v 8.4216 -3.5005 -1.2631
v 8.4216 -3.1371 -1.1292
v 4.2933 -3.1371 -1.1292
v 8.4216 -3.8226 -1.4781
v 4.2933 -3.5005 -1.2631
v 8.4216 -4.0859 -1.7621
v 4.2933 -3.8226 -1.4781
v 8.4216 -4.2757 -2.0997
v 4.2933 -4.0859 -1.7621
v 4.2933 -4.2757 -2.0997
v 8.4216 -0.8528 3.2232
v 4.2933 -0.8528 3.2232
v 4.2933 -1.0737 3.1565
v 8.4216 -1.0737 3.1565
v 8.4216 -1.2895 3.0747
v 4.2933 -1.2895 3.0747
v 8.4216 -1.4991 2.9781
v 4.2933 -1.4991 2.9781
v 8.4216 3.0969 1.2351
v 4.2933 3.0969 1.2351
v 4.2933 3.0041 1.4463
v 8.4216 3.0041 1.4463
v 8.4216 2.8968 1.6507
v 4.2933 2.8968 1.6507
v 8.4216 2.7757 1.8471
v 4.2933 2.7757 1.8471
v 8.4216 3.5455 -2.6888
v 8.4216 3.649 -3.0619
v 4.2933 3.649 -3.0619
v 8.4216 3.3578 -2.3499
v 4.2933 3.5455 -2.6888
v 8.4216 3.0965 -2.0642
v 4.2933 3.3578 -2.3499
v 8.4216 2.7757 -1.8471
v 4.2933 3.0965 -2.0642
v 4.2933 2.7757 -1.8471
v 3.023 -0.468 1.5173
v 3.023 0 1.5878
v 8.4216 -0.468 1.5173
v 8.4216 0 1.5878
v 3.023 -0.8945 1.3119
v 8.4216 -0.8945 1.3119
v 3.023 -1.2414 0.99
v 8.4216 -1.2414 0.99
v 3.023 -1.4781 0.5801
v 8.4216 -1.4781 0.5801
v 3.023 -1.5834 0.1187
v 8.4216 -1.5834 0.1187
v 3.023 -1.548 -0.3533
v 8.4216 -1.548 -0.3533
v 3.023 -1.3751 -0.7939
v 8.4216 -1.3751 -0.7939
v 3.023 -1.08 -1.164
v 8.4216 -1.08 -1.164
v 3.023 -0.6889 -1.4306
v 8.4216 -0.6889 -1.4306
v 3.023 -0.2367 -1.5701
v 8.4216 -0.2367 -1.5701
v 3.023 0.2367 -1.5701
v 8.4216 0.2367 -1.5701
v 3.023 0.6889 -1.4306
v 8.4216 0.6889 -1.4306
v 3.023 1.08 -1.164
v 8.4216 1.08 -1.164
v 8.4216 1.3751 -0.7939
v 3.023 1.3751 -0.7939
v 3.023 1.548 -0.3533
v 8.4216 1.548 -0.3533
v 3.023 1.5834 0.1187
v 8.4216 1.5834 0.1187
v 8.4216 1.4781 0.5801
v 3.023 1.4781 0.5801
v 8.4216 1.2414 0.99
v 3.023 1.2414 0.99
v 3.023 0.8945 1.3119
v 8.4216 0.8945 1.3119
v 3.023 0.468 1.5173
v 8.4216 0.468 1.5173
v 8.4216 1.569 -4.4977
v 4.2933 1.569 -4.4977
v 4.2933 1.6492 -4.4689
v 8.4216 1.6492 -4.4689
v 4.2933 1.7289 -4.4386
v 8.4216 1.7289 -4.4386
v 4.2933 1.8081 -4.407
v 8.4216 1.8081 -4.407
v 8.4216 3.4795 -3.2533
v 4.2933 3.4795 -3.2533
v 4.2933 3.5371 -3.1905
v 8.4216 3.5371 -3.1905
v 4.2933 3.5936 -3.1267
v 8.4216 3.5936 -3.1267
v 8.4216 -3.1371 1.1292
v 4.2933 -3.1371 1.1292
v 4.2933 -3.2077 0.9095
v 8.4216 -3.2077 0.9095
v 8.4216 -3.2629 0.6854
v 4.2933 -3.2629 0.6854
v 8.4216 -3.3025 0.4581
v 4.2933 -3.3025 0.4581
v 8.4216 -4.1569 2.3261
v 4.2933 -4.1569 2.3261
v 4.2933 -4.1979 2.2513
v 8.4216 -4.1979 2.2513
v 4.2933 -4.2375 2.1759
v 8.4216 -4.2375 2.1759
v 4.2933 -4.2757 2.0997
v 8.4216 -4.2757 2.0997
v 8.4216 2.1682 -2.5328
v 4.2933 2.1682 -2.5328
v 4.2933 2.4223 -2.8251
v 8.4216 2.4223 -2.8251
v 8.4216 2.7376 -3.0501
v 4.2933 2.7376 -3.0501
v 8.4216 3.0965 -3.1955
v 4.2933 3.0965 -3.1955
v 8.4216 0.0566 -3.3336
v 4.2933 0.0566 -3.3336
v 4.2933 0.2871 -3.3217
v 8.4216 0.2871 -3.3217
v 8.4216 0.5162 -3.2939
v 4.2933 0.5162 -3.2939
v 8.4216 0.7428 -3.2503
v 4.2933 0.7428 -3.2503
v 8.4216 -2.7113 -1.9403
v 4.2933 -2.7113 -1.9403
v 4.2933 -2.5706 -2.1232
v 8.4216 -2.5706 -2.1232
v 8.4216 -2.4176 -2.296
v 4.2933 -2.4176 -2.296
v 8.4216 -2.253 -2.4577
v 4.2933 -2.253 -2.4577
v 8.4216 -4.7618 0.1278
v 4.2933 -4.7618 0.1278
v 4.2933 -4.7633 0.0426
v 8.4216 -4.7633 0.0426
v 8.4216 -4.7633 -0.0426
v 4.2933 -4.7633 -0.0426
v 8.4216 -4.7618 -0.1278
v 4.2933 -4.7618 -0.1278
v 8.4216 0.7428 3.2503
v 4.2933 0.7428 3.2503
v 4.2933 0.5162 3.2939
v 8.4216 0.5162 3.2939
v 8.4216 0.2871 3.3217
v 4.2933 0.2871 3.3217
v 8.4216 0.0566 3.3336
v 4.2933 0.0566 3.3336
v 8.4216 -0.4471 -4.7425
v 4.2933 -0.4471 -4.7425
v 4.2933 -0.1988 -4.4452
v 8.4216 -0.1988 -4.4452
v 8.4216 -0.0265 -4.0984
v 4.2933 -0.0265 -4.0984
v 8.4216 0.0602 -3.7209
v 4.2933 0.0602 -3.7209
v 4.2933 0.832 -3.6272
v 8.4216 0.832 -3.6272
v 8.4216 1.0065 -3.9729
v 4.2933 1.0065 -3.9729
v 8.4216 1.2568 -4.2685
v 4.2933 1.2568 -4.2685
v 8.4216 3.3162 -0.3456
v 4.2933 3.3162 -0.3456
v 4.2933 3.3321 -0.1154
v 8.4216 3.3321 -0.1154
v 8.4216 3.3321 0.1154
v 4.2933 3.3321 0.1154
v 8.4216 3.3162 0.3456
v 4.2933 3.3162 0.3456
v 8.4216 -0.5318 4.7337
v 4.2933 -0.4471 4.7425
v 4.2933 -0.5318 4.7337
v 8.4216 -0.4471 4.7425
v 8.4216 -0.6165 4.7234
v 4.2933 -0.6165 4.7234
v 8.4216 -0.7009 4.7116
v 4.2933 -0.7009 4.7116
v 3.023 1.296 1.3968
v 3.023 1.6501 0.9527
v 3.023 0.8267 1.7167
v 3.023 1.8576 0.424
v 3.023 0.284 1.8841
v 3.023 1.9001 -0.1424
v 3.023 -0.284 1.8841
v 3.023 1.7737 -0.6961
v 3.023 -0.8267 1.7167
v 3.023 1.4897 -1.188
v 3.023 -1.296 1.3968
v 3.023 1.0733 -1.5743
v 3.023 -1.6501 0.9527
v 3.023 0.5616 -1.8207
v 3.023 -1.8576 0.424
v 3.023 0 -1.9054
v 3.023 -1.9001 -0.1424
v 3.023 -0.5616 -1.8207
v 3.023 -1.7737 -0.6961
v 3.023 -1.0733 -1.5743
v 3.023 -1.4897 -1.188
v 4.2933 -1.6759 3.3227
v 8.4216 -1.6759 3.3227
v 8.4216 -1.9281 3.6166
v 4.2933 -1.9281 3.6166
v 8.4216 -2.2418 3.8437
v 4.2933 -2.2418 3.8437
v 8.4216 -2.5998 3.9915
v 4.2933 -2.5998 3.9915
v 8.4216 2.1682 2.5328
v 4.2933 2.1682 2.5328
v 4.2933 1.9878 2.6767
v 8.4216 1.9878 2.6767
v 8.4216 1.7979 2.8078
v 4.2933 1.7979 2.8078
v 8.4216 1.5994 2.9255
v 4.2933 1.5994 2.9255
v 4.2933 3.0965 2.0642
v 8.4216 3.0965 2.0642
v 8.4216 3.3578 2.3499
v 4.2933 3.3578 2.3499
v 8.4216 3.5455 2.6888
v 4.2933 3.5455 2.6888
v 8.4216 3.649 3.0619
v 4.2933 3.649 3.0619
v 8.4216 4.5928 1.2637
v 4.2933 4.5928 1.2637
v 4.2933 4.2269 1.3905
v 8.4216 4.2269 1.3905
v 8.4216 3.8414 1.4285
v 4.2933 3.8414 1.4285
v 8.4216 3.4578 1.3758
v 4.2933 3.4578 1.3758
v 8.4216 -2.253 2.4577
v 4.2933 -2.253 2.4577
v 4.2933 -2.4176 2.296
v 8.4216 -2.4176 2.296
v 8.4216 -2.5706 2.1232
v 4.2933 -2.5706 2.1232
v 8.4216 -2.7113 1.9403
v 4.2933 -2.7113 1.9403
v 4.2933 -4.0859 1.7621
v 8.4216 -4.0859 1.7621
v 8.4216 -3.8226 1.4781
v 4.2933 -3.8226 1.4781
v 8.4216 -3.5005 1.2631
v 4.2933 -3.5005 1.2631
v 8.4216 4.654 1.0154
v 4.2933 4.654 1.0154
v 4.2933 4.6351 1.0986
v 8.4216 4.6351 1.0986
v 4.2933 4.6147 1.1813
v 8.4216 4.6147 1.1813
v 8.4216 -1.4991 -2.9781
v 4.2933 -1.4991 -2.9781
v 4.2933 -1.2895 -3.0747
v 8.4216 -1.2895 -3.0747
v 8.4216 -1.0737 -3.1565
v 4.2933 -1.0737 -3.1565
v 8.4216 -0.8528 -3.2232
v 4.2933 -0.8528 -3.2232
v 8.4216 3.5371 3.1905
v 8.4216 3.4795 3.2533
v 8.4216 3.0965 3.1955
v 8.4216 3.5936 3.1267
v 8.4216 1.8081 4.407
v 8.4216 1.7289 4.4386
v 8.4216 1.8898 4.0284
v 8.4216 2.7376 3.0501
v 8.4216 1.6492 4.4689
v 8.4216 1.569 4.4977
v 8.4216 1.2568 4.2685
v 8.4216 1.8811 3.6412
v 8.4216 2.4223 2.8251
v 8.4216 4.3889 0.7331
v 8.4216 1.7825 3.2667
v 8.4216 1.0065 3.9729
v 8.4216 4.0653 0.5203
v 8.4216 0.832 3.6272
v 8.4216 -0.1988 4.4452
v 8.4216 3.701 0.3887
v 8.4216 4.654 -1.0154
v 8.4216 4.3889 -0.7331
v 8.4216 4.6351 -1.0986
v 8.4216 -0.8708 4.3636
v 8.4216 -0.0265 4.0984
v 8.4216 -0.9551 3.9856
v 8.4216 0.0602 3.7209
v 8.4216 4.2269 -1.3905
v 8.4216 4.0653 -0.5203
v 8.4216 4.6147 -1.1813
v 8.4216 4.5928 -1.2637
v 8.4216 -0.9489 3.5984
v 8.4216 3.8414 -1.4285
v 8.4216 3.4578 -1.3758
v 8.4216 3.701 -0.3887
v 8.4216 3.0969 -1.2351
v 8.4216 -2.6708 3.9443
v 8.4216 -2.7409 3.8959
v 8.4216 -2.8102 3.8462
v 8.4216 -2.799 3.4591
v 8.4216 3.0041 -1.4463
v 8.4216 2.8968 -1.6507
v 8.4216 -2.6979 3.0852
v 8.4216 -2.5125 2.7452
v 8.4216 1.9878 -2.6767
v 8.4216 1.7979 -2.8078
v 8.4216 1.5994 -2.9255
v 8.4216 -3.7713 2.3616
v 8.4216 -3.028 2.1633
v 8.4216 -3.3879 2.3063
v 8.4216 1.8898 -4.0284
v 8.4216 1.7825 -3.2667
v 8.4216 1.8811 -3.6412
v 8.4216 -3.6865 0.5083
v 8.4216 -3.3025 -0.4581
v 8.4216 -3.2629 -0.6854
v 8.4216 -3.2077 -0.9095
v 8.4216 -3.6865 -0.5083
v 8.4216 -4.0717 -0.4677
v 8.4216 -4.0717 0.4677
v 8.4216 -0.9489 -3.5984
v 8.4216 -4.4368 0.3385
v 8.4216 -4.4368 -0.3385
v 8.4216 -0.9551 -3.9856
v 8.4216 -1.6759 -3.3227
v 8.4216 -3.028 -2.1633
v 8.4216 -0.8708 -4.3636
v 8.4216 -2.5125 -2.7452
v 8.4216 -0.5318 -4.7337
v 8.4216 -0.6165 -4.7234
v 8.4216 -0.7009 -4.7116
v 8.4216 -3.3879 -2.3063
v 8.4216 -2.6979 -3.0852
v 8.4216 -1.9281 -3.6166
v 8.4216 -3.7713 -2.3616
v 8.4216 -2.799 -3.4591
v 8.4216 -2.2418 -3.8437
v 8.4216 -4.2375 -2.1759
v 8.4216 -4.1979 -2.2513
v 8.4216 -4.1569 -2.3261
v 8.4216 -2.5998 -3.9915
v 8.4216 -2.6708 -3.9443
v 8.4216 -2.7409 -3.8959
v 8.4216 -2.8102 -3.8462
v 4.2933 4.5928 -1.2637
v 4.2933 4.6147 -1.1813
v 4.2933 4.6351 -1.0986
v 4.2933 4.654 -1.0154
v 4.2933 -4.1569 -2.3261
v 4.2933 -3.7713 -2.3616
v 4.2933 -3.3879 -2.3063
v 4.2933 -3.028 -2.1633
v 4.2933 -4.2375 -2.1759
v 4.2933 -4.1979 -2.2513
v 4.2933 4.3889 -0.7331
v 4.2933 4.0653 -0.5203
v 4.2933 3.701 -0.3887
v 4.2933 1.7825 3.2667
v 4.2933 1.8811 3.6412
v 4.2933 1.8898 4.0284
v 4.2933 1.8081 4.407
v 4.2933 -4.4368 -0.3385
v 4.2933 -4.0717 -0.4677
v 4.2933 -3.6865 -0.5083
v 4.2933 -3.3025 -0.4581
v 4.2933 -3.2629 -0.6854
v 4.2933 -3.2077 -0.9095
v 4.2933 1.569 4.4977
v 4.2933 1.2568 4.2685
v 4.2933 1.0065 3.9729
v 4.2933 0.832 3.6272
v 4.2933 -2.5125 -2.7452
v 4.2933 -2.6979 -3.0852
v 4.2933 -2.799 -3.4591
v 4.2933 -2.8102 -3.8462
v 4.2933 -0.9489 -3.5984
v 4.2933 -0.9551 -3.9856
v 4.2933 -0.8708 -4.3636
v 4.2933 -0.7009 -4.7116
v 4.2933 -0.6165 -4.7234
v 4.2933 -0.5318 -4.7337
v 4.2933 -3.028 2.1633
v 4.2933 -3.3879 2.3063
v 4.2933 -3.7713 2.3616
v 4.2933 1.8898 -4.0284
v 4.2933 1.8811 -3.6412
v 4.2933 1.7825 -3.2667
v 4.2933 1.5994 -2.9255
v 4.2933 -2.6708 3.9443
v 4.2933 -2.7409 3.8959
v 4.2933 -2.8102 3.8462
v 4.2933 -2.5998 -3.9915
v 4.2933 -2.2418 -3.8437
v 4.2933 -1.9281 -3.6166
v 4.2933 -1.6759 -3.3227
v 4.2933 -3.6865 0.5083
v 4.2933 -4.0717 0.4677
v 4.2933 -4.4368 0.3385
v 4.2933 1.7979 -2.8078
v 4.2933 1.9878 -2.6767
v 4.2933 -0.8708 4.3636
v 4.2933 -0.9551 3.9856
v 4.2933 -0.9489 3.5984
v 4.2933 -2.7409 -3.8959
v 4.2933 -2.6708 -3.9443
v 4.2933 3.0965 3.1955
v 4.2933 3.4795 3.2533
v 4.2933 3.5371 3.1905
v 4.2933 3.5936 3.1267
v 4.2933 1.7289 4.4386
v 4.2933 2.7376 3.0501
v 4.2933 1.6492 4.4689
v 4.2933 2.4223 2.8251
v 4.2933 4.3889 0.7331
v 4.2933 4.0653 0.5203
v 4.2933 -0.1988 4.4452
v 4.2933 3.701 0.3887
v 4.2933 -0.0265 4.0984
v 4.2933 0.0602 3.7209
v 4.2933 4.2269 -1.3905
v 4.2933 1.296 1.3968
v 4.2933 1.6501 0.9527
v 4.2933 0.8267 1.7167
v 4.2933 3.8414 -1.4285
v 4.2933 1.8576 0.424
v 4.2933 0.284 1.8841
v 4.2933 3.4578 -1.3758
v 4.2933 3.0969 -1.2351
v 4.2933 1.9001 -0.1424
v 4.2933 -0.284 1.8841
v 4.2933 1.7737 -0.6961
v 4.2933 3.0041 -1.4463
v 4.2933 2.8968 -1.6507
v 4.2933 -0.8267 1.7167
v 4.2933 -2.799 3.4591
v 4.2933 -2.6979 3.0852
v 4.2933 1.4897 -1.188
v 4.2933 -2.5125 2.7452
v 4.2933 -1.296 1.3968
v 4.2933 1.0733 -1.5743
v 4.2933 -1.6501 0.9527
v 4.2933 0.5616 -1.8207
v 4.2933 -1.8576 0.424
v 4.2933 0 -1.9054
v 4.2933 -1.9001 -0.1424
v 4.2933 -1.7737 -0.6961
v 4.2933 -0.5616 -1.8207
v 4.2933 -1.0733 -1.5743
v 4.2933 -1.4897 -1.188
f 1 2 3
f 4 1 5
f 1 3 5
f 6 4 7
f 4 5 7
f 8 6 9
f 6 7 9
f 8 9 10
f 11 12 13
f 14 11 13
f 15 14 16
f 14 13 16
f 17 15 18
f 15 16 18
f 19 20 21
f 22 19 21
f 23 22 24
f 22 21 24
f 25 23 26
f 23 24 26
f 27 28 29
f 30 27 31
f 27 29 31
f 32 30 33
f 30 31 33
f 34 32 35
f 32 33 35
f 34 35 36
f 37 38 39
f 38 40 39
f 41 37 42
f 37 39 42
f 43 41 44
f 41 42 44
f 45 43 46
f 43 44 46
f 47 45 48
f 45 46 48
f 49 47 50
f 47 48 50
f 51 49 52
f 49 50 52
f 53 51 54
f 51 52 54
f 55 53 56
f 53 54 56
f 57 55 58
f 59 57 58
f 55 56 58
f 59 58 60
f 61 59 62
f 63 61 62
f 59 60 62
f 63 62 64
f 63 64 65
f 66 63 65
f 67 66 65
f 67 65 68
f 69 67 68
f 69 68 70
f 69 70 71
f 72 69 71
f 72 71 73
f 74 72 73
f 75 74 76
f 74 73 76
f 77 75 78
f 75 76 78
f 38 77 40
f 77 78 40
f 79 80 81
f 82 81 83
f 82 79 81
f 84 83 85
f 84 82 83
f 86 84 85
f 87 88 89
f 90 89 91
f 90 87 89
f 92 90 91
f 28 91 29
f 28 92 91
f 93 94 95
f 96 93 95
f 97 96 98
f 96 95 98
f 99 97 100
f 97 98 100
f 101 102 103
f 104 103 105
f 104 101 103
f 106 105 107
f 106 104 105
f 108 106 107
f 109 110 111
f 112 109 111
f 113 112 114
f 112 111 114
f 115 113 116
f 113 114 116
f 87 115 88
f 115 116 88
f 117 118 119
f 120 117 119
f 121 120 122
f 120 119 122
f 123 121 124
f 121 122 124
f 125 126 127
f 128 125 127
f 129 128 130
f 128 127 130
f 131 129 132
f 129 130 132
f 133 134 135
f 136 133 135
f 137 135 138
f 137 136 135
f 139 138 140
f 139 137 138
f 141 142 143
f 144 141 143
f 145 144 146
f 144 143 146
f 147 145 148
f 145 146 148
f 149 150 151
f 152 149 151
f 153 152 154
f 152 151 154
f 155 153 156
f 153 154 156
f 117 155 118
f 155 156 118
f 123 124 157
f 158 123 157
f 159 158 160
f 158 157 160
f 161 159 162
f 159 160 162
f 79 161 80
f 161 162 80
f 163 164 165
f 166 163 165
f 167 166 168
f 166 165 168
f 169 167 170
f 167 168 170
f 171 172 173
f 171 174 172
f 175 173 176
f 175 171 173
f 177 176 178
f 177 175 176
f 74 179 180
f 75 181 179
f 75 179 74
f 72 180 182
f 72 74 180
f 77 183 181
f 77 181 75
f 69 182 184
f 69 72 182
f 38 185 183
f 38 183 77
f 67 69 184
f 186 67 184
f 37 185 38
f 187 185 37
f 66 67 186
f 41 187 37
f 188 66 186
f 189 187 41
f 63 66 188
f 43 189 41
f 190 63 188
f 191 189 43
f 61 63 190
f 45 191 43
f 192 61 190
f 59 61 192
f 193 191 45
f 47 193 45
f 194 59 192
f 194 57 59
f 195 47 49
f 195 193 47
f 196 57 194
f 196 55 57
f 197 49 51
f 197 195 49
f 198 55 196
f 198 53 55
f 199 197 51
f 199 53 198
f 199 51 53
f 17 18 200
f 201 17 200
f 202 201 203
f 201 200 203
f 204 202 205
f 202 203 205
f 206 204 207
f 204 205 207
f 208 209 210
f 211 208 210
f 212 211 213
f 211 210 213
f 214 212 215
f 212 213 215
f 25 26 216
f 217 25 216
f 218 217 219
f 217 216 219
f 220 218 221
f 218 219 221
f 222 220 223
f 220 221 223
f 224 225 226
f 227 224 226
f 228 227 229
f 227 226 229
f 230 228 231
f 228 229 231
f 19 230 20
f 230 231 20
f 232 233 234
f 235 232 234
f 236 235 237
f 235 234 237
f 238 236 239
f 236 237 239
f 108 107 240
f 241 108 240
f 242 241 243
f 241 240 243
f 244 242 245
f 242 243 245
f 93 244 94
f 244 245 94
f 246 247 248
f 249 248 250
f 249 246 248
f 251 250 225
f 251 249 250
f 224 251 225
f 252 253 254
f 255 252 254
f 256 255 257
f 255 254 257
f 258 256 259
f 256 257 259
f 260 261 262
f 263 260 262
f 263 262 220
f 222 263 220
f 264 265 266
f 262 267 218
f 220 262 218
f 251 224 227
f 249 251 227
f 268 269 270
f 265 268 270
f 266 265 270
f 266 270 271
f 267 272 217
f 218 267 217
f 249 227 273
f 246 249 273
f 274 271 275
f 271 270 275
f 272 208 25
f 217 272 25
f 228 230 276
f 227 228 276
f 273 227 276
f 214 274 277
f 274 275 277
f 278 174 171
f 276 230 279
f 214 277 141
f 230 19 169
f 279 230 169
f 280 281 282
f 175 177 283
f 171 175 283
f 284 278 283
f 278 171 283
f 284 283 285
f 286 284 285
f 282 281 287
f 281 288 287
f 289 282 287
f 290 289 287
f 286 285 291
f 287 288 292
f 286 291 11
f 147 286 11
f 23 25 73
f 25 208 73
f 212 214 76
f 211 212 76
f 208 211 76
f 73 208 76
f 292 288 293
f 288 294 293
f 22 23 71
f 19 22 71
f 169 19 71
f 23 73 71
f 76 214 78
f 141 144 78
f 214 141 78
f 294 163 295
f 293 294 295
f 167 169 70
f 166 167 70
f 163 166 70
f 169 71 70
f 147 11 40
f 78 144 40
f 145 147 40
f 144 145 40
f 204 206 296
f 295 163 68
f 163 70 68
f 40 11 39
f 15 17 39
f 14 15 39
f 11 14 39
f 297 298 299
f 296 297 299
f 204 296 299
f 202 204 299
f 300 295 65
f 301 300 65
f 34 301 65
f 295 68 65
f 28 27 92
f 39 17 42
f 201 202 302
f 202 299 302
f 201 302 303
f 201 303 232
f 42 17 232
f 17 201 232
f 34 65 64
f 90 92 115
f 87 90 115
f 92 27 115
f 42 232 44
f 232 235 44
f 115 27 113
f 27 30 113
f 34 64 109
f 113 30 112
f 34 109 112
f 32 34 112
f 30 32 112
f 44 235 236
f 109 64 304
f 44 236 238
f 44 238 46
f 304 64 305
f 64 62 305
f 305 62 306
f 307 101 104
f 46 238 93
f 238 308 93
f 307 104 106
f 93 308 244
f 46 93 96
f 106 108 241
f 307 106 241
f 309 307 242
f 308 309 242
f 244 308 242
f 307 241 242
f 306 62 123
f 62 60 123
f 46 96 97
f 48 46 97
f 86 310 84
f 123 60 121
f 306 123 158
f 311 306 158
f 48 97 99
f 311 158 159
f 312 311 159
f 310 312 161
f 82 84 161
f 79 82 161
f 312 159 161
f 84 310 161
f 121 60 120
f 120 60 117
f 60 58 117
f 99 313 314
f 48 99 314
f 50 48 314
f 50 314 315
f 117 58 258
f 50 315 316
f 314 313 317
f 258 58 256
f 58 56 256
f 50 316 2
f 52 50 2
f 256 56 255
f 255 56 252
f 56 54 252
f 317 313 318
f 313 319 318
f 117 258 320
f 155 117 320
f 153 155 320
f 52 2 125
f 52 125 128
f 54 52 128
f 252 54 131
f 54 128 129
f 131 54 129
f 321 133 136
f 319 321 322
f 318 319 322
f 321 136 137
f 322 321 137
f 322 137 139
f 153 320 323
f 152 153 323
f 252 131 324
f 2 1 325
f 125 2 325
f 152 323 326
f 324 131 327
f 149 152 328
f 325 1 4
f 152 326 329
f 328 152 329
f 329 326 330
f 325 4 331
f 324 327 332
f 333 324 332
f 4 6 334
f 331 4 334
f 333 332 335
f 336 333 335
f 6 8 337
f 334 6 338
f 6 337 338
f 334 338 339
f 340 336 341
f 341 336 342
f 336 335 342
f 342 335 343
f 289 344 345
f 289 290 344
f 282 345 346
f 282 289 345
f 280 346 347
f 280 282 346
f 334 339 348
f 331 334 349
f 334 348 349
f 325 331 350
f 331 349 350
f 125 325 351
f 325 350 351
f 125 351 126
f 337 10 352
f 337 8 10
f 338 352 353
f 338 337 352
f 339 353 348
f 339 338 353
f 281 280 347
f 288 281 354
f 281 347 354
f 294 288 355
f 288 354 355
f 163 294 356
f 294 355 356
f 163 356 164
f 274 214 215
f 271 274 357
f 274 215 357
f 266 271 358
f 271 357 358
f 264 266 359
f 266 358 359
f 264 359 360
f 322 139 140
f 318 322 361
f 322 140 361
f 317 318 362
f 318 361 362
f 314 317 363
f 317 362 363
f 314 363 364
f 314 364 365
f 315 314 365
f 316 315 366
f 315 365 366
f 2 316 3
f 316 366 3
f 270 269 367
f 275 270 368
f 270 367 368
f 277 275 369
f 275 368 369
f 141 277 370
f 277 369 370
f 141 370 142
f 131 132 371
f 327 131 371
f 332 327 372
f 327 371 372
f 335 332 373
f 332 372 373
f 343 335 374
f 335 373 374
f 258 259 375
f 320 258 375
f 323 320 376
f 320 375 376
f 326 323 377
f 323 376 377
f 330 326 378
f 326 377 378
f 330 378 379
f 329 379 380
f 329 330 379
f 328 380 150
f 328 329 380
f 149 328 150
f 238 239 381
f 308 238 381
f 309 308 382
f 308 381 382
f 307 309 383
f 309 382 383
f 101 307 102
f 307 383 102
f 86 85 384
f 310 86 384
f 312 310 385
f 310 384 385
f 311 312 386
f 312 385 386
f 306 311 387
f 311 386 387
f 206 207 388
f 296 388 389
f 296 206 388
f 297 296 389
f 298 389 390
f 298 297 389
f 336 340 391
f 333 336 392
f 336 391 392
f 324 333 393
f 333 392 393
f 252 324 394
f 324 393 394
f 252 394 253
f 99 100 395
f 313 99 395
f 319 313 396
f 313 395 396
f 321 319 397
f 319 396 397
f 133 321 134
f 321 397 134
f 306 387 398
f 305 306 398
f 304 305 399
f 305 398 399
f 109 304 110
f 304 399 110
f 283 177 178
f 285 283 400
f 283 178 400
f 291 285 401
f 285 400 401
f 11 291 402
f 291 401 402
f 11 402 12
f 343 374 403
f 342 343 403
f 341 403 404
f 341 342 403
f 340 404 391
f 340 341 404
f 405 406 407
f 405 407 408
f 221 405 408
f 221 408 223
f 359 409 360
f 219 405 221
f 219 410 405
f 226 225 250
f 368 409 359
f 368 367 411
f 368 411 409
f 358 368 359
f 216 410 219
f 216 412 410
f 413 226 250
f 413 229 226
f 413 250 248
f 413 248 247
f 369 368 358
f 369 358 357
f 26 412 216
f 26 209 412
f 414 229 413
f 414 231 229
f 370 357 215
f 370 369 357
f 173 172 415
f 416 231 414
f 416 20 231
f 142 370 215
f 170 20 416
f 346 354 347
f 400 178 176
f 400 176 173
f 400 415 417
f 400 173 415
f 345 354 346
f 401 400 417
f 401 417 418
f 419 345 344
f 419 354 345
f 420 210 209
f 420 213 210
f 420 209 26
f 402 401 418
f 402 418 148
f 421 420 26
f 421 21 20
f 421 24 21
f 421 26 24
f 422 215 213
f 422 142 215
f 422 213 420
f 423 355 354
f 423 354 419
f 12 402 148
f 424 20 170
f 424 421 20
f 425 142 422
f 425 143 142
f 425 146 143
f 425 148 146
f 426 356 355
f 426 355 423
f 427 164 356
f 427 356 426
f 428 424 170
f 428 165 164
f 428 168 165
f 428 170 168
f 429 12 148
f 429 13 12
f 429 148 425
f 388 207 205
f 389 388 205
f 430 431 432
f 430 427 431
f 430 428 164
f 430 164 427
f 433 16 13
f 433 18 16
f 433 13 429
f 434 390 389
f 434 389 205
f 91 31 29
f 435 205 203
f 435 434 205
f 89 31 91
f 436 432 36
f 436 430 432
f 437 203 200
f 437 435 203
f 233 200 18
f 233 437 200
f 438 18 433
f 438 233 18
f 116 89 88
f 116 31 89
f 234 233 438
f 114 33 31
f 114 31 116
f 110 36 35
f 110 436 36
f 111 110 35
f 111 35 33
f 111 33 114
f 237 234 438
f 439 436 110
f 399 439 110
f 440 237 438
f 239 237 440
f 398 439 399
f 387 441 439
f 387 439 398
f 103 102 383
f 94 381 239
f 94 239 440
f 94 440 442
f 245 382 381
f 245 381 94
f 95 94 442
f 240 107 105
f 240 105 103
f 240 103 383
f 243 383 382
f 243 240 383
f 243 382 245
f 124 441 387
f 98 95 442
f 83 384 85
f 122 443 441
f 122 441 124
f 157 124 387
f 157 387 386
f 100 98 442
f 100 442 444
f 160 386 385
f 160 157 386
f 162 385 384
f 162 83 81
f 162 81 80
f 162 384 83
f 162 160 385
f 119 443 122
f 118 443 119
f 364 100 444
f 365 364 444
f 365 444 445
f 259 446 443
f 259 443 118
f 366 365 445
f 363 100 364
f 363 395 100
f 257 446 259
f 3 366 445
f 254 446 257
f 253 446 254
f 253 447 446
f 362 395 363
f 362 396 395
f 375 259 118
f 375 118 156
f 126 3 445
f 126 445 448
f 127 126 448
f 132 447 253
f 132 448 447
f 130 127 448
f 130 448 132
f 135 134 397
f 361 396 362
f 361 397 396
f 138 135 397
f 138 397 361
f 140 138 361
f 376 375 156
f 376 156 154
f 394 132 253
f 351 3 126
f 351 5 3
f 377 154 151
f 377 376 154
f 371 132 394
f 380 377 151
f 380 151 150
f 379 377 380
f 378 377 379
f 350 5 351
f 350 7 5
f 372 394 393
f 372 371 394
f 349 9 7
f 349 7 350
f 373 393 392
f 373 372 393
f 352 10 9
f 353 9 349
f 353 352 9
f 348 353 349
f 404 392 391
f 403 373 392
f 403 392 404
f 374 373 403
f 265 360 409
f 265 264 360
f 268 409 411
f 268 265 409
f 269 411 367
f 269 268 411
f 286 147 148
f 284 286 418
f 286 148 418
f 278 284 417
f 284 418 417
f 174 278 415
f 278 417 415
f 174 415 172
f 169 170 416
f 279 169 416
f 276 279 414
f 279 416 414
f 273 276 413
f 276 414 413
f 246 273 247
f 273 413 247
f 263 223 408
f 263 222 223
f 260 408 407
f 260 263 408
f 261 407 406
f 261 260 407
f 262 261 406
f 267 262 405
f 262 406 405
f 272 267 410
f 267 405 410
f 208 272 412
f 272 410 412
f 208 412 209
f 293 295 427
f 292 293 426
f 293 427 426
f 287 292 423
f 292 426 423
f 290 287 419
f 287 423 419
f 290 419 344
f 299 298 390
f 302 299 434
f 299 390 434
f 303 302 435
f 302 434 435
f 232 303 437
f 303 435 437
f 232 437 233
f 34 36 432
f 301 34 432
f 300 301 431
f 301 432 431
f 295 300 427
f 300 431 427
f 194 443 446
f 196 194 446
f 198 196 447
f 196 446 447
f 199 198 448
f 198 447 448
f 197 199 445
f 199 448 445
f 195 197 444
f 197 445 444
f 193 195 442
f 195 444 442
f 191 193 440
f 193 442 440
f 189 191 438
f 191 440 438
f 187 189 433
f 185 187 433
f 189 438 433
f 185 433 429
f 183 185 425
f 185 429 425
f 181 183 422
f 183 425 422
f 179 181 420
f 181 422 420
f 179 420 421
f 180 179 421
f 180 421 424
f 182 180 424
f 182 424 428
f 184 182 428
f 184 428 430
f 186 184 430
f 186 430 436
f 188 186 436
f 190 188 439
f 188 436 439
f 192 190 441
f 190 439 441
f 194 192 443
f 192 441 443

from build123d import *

# Parameters (mm, degrees)
BASPROSKE_W      = 13
BASPROSKE_H      = 15
TOOTHCUT_DEPTH   = 25.879710609
TEETHCUTS_COUNT  = 13
TEETHCUTS_ANGLE  = 332.307692308
HUBNEAONESKE_R   = 6
HUBNEARONE_DEPTH = 4.0000508
BORSKE_R         = 5
BORE_DEPTH       = 17.0000508
SCALE1_SCALE     = 0.317565217


with BuildPart() as part:
    # BasProSke → Base-Revolve (revolve)
    with BuildSketch(Plane(origin=(0, 0, 0), x_dir=(1, 0, 0), z_dir=(0, 1, 0)), mode=Mode.PRIVATE) as base_revolve_sk:
        with Locations((6.5, 7.5)):
            Rectangle(BASPROSKE_W, BASPROSKE_H)
    revolve(base_revolve_sk.sketch.rotate(Axis((-10, 0, 0), (1, 0, 0)), 180), axis=Axis((-10, 0, 0), (1, 0, 0)))

    # TooCutSke → ToothCut (cut, through all)
    with BuildSketch(Plane(origin=(0, 0, 0), x_dir=(0, 0, -1), z_dir=(1, 0, 0))):
        with BuildLine():
            ThreePointArc((1.088245291, 10.442448141), (0, 10.499), (-1.088245291, 10.442448141))
            ThreePointArc((-1.088245291, 10.442448141), (-1.646045958, 12.816546547), (-3.224884568, 14.675243258))
            ThreePointArc((-3.224884568, 14.675243258), (0, 15.0254), (3.224884568, 14.675243258))
            ThreePointArc((3.224884568, 14.675243258), (1.646045958, 12.816546547), (1.088245291, 10.442448141))
        make_face()
    toothcut = extrude(amount=TOOTHCUT_DEPTH, mode=Mode.SUBTRACT)

    # TeethCuts: ToothCut ×13 about axis
    teethcuts_axis = Axis((-10, 0, 0), (1, 0, 0))
    for i in range(1, TEETHCUTS_COUNT):
        add(toothcut.rotate(teethcuts_axis, i * TEETHCUTS_ANGLE / (TEETHCUTS_COUNT - 1)), mode=Mode.SUBTRACT)

    # HubNeaOneSke → HubNearOne (add)
    with BuildSketch(Plane.ZY):
        with Locations(Location((0, 0, 0), (0, 0, 180))):
            Circle(HUBNEAONESKE_R)
    extrude(amount=HUBNEARONE_DEPTH)

    # BorSke → Bore (cut, symmetric)
    with BuildSketch(Plane(origin=(0, 0, 0), x_dir=(0, 0, -1), z_dir=(1, 0, 0))):
        with Locations(Location((0, 0, 0), (0, 0, 180))):
            Circle(BORSKE_R)
    extrude(amount=BORE_DEPTH, both=True, mode=Mode.SUBTRACT)


with BuildPart() as part_1:
    # Scale1: scaled about (6.291140597, 0, 0)
    add(part.part.scale(SCALE1_SCALE).moved(Location((4.293293168, 0, 0))))


solid = part_1.part
